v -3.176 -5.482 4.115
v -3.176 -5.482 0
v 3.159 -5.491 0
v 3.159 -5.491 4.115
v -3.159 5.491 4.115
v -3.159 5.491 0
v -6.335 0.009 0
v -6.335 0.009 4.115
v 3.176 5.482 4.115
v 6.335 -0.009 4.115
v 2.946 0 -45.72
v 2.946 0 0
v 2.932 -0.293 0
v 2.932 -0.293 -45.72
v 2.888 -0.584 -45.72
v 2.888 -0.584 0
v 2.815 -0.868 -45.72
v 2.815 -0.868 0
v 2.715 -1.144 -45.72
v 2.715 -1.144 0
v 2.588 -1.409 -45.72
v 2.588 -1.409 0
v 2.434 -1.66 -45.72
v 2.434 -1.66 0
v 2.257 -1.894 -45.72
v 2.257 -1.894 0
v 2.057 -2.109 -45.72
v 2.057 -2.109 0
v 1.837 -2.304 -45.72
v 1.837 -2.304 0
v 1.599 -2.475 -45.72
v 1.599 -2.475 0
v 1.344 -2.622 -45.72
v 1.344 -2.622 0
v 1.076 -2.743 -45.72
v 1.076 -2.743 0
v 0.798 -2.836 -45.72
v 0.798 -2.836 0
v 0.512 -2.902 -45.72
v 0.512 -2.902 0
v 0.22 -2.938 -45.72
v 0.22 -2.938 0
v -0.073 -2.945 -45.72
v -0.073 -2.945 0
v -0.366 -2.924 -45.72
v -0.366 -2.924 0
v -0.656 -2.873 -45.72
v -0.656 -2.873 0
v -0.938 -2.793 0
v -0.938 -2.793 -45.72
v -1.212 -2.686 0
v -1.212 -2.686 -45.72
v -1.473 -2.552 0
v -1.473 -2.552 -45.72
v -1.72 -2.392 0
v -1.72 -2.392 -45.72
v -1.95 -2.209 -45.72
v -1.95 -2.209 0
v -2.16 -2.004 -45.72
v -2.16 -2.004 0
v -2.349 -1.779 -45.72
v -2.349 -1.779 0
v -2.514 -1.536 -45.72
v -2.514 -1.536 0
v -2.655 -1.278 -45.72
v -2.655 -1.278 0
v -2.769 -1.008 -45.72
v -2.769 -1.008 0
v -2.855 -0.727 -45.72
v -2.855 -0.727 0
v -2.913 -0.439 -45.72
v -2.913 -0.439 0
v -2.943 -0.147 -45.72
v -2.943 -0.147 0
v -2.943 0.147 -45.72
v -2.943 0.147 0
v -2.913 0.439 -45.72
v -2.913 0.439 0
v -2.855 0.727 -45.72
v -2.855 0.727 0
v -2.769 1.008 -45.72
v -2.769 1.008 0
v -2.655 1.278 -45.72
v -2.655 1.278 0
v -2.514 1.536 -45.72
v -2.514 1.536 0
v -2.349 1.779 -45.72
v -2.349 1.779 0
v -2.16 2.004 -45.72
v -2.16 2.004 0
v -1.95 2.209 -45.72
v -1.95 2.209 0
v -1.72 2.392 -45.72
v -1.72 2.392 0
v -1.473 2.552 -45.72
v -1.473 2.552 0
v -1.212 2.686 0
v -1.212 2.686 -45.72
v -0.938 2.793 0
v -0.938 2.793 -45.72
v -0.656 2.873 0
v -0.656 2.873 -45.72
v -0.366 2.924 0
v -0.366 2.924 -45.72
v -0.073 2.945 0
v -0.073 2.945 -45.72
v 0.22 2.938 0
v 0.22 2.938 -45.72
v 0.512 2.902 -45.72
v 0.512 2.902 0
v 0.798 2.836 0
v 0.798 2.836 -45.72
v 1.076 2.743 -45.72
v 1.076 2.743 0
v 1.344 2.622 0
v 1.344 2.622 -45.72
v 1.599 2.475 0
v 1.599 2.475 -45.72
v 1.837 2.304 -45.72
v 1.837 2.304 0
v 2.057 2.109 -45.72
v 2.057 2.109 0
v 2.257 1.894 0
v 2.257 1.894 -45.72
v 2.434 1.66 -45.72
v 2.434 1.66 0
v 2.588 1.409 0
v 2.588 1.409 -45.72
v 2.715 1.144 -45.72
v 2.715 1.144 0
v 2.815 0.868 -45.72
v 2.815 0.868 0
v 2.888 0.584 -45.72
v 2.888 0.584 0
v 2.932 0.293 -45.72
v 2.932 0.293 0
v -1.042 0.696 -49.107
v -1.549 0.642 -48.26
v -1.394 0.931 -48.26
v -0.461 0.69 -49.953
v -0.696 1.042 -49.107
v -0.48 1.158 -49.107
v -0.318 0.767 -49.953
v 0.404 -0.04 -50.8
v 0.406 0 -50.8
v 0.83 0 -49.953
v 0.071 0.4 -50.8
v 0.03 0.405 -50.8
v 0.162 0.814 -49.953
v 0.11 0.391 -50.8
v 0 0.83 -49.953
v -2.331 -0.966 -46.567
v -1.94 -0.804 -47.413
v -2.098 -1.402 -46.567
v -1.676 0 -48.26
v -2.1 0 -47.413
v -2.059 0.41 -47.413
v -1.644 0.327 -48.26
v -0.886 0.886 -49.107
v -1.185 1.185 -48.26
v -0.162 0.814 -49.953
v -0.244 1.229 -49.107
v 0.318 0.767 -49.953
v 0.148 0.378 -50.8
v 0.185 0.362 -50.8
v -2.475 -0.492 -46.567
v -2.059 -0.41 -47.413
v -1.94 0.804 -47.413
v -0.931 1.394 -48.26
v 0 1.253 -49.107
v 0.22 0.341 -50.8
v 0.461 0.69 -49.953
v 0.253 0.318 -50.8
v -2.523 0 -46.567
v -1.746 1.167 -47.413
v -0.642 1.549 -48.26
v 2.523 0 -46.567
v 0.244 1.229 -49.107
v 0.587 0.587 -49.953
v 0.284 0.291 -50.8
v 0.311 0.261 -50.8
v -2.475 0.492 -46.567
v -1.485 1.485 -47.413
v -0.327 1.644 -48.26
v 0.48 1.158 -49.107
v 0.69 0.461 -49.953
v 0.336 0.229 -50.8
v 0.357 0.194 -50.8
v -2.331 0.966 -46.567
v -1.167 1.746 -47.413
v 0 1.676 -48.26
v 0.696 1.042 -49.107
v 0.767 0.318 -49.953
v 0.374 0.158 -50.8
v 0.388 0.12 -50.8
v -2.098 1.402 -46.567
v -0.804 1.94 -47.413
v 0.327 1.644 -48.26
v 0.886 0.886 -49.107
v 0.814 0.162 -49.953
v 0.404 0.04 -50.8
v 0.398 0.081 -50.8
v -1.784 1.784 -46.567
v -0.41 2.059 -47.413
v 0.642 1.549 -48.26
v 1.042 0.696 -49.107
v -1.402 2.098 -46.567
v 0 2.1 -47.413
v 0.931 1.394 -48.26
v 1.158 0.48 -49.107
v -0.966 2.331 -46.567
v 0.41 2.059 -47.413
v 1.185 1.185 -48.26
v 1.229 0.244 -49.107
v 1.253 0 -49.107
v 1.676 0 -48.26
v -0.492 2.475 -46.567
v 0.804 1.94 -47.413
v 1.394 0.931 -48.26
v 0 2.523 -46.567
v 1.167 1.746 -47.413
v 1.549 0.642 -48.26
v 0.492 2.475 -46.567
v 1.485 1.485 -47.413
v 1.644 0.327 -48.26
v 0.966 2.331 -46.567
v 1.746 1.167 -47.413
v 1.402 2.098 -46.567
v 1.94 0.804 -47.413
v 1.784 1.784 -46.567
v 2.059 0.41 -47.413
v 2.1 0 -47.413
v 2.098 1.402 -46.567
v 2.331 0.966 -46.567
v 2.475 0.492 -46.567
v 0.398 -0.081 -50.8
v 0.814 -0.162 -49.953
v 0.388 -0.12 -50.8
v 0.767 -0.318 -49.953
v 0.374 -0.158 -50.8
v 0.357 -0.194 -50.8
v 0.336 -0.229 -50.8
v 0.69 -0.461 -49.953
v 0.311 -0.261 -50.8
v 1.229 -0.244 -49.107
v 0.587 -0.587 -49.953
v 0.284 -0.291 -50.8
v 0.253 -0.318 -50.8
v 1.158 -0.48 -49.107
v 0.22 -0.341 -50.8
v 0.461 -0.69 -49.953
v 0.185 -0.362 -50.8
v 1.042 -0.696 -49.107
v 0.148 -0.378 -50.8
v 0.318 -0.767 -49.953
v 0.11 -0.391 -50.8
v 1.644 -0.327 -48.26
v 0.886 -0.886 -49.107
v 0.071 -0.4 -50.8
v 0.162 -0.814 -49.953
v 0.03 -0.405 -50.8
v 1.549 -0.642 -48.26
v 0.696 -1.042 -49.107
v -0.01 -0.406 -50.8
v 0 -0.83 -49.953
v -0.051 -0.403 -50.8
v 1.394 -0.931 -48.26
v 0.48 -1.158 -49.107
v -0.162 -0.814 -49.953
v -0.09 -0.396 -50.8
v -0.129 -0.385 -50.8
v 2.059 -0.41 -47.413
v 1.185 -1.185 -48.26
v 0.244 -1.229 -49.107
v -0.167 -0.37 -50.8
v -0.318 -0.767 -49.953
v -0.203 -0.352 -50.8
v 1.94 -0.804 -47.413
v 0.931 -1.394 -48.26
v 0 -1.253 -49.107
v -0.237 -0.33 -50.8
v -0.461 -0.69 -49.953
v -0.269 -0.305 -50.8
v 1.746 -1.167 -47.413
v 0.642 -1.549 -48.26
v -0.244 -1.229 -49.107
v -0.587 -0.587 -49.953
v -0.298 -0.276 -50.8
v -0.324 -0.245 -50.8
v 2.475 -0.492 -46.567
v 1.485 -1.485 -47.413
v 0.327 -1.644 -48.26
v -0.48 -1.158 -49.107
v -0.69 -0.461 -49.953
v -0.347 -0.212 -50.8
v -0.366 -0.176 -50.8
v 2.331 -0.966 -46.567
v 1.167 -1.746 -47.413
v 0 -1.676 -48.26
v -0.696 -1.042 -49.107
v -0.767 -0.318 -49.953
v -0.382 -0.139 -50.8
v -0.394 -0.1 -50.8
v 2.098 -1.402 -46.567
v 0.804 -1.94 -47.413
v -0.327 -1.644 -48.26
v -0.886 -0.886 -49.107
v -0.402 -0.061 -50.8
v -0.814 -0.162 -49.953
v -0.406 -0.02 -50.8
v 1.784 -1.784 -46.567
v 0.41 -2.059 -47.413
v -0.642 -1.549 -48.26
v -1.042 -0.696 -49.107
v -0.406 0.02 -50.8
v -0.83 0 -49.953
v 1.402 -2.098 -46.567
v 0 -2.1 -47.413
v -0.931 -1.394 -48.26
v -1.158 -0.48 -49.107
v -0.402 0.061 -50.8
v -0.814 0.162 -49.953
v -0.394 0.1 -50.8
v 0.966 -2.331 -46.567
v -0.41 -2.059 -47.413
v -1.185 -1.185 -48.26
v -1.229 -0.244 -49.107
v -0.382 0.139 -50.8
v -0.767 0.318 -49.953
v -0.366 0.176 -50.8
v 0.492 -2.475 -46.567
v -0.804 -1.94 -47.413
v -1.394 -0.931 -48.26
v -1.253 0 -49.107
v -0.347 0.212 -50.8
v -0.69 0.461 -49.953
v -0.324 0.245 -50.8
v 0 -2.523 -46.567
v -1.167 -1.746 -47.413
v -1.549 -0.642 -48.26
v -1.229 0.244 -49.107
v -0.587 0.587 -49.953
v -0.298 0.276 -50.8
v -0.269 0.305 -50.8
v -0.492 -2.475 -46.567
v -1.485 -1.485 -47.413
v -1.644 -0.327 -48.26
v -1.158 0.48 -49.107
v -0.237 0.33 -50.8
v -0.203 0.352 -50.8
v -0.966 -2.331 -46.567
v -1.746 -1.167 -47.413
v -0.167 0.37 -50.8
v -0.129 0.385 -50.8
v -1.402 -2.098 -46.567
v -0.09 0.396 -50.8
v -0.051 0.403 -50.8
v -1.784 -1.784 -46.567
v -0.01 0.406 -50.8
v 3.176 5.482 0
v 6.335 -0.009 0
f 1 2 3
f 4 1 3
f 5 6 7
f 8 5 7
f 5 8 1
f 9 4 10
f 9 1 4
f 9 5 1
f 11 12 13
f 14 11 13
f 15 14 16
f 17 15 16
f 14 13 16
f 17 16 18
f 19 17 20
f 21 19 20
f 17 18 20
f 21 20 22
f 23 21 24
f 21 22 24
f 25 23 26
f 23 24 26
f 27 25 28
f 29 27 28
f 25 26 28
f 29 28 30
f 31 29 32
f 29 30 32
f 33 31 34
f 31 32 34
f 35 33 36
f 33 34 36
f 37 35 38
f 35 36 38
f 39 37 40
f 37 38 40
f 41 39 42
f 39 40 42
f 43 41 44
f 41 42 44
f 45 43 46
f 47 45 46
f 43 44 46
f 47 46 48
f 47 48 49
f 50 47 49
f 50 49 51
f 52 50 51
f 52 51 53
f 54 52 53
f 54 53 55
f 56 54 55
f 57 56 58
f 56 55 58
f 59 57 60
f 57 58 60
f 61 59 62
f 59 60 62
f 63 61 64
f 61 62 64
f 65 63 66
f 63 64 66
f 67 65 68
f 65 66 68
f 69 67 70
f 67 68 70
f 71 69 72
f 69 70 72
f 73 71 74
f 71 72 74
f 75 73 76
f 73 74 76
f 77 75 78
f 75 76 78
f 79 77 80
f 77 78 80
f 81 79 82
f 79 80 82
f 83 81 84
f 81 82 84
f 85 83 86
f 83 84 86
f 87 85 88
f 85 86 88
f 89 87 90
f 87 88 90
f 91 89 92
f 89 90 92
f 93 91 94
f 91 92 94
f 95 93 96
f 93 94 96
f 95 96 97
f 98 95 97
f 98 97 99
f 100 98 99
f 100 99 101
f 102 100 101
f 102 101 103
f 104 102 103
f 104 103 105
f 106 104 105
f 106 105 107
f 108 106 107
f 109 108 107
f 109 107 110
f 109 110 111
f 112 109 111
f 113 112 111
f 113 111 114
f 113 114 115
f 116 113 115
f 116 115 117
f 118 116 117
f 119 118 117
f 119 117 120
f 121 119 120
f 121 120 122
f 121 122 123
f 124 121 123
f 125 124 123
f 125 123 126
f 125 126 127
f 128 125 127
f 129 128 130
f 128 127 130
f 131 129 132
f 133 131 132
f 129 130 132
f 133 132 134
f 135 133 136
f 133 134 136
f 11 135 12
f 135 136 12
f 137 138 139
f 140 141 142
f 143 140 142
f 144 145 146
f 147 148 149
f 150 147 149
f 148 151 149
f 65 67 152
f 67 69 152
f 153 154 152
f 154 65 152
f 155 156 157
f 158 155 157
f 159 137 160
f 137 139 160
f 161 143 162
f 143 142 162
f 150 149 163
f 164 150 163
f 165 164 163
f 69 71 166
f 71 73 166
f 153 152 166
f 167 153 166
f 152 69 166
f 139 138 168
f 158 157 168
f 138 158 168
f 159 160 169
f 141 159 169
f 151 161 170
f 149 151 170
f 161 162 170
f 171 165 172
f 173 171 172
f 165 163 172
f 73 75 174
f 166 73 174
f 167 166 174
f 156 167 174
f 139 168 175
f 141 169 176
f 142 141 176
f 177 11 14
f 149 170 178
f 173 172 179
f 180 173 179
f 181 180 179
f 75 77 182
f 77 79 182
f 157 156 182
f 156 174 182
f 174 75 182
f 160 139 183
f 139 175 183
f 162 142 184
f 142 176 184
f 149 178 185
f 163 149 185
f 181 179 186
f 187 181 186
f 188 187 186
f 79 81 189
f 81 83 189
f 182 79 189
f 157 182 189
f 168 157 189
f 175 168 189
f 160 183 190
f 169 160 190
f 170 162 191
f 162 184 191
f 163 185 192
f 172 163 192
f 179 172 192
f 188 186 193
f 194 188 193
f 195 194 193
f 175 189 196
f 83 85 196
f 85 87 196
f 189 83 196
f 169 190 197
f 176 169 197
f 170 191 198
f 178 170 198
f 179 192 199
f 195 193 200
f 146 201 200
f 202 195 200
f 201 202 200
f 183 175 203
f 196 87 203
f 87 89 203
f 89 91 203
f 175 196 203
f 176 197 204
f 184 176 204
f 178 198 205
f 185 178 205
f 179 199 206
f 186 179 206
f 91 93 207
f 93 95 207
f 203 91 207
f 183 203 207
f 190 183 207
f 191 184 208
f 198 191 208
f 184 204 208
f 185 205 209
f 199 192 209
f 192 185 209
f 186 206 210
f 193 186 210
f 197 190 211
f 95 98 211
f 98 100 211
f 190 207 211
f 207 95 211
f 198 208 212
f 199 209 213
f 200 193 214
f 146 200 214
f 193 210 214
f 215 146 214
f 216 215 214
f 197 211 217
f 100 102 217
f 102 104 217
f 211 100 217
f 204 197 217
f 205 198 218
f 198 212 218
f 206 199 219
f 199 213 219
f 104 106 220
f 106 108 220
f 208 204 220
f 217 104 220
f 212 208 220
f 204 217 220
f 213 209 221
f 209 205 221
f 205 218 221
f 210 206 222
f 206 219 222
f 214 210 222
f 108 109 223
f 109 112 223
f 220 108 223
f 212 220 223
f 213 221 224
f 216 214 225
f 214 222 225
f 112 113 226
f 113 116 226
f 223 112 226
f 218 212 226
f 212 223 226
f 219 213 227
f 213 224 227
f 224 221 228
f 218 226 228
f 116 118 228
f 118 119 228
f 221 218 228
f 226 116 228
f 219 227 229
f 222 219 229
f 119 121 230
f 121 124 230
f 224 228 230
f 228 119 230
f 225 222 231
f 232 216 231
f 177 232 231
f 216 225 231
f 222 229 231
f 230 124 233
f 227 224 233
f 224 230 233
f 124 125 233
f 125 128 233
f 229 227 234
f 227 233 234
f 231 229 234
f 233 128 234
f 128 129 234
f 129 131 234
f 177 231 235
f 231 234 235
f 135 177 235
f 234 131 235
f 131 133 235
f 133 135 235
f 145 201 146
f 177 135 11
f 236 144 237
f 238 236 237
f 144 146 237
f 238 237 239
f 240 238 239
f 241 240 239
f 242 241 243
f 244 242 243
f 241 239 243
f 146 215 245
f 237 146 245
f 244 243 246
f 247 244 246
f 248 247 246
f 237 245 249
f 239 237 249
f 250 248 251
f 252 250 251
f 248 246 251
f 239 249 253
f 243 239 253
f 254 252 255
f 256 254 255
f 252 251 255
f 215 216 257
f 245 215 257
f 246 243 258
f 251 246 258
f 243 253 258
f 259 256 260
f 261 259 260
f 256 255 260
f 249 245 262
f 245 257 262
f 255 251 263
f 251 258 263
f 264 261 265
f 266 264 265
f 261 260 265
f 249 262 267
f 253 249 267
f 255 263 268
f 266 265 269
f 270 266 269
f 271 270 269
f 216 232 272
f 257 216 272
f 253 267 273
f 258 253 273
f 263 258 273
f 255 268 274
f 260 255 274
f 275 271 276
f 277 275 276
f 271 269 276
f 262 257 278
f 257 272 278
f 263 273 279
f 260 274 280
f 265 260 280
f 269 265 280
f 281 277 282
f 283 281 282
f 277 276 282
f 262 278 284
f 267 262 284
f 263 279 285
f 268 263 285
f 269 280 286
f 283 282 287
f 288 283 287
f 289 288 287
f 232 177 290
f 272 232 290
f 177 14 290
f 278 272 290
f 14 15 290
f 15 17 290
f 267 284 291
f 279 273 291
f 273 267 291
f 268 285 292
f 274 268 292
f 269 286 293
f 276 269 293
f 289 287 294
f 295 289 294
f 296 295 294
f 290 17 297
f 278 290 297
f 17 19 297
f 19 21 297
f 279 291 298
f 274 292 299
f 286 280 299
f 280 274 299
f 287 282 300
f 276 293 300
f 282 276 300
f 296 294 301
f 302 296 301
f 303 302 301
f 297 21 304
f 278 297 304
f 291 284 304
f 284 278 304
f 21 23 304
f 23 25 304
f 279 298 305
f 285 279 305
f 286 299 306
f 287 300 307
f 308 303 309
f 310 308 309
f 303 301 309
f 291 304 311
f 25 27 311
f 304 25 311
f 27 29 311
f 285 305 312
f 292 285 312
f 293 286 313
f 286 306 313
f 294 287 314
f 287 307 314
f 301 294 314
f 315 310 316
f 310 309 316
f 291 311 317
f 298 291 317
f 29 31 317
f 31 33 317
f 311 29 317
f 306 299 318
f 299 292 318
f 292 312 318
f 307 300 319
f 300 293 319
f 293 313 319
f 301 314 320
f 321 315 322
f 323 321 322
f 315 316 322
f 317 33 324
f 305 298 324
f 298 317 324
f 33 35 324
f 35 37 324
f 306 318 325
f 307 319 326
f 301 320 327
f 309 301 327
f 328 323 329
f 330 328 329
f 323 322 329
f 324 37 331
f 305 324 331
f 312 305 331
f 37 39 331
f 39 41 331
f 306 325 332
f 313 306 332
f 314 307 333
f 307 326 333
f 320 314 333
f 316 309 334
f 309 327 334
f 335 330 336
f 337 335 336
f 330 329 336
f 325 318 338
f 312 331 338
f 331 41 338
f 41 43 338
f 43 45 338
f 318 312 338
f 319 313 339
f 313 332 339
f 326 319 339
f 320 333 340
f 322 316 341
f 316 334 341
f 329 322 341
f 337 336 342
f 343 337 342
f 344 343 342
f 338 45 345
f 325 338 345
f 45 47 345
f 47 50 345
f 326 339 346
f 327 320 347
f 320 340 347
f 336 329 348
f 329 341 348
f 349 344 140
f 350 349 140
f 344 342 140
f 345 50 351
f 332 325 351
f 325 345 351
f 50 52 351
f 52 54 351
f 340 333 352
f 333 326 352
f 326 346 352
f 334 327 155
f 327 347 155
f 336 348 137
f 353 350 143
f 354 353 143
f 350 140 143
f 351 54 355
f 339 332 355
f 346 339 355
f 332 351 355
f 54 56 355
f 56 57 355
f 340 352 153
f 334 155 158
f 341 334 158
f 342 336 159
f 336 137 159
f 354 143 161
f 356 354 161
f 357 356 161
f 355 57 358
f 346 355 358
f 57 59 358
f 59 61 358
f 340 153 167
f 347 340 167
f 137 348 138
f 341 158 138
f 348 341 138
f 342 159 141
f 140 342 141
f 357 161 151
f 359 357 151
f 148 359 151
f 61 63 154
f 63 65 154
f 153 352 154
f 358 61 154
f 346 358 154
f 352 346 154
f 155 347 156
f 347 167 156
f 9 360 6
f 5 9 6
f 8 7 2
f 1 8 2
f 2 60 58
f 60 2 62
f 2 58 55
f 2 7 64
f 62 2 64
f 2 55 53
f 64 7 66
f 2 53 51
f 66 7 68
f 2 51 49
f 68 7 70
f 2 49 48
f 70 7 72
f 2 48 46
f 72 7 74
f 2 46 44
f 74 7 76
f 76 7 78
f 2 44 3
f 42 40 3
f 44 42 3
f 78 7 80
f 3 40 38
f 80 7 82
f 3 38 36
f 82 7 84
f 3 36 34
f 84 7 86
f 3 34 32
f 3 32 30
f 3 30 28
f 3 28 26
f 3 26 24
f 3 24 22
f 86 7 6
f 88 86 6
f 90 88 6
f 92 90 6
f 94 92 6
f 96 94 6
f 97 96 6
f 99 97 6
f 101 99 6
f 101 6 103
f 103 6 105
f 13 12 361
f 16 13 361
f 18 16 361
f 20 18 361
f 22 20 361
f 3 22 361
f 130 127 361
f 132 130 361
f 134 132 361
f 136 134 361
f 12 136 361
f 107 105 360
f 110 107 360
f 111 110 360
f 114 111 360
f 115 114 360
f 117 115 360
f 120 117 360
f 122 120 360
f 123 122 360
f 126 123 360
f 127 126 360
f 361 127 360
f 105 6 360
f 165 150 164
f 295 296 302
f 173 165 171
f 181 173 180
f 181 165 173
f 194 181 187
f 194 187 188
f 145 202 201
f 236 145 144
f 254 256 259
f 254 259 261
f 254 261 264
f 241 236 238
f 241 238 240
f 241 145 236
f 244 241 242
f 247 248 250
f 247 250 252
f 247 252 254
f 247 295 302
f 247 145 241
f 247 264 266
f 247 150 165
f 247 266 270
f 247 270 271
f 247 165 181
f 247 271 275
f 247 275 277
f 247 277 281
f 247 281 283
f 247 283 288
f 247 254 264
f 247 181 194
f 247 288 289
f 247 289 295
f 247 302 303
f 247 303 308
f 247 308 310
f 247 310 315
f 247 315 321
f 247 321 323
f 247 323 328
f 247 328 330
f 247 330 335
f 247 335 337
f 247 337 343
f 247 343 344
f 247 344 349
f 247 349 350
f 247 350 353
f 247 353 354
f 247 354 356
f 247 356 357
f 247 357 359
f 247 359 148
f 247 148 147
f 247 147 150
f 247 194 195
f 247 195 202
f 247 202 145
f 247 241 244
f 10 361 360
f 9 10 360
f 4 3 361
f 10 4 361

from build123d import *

# Parameters (mm, degrees)
F1_DEPTH = 4.1148
F2_R     = 2.9464
F3_DEPTH = 50.8
F4_SIZE2 = 5.08
F4_SIZE  = 2.54


with BuildPart() as f1:
    # F0 (on Top) → F1 (new body)
    with BuildSketch(Plane.XY):
        Polygon((3.1593841377, -5.4911205733), (6.3351419806, -0.0094533631), (3.1757578428, 5.4816672102), (-3.1593841377, 5.4911205733), (-6.3351419806, 0.0094533631), (-3.1757578428, -5.4816672102), align=None)
    extrude(amount=F1_DEPTH)

    # F2 (on face) → F3 (join)
    with BuildSketch(Plane(origin=(0, 0, 0), x_dir=(1, 0, 0), z_dir=(0, 0, -1))):
        Circle(F2_R)
    extrude(amount=F3_DEPTH)

    # F4
    f4_edges = [f1.edges().sort_by_distance(p)[0] for p in [
        (-2.9464, 0, -50.8),
    ]]
    f4_side = f1.faces().sort_by_distance((0, 0, -50.8))[0]
    chamfer(f4_edges, length=F4_SIZE, length2=F4_SIZE2, reference=f4_side)


solid = f1.part
